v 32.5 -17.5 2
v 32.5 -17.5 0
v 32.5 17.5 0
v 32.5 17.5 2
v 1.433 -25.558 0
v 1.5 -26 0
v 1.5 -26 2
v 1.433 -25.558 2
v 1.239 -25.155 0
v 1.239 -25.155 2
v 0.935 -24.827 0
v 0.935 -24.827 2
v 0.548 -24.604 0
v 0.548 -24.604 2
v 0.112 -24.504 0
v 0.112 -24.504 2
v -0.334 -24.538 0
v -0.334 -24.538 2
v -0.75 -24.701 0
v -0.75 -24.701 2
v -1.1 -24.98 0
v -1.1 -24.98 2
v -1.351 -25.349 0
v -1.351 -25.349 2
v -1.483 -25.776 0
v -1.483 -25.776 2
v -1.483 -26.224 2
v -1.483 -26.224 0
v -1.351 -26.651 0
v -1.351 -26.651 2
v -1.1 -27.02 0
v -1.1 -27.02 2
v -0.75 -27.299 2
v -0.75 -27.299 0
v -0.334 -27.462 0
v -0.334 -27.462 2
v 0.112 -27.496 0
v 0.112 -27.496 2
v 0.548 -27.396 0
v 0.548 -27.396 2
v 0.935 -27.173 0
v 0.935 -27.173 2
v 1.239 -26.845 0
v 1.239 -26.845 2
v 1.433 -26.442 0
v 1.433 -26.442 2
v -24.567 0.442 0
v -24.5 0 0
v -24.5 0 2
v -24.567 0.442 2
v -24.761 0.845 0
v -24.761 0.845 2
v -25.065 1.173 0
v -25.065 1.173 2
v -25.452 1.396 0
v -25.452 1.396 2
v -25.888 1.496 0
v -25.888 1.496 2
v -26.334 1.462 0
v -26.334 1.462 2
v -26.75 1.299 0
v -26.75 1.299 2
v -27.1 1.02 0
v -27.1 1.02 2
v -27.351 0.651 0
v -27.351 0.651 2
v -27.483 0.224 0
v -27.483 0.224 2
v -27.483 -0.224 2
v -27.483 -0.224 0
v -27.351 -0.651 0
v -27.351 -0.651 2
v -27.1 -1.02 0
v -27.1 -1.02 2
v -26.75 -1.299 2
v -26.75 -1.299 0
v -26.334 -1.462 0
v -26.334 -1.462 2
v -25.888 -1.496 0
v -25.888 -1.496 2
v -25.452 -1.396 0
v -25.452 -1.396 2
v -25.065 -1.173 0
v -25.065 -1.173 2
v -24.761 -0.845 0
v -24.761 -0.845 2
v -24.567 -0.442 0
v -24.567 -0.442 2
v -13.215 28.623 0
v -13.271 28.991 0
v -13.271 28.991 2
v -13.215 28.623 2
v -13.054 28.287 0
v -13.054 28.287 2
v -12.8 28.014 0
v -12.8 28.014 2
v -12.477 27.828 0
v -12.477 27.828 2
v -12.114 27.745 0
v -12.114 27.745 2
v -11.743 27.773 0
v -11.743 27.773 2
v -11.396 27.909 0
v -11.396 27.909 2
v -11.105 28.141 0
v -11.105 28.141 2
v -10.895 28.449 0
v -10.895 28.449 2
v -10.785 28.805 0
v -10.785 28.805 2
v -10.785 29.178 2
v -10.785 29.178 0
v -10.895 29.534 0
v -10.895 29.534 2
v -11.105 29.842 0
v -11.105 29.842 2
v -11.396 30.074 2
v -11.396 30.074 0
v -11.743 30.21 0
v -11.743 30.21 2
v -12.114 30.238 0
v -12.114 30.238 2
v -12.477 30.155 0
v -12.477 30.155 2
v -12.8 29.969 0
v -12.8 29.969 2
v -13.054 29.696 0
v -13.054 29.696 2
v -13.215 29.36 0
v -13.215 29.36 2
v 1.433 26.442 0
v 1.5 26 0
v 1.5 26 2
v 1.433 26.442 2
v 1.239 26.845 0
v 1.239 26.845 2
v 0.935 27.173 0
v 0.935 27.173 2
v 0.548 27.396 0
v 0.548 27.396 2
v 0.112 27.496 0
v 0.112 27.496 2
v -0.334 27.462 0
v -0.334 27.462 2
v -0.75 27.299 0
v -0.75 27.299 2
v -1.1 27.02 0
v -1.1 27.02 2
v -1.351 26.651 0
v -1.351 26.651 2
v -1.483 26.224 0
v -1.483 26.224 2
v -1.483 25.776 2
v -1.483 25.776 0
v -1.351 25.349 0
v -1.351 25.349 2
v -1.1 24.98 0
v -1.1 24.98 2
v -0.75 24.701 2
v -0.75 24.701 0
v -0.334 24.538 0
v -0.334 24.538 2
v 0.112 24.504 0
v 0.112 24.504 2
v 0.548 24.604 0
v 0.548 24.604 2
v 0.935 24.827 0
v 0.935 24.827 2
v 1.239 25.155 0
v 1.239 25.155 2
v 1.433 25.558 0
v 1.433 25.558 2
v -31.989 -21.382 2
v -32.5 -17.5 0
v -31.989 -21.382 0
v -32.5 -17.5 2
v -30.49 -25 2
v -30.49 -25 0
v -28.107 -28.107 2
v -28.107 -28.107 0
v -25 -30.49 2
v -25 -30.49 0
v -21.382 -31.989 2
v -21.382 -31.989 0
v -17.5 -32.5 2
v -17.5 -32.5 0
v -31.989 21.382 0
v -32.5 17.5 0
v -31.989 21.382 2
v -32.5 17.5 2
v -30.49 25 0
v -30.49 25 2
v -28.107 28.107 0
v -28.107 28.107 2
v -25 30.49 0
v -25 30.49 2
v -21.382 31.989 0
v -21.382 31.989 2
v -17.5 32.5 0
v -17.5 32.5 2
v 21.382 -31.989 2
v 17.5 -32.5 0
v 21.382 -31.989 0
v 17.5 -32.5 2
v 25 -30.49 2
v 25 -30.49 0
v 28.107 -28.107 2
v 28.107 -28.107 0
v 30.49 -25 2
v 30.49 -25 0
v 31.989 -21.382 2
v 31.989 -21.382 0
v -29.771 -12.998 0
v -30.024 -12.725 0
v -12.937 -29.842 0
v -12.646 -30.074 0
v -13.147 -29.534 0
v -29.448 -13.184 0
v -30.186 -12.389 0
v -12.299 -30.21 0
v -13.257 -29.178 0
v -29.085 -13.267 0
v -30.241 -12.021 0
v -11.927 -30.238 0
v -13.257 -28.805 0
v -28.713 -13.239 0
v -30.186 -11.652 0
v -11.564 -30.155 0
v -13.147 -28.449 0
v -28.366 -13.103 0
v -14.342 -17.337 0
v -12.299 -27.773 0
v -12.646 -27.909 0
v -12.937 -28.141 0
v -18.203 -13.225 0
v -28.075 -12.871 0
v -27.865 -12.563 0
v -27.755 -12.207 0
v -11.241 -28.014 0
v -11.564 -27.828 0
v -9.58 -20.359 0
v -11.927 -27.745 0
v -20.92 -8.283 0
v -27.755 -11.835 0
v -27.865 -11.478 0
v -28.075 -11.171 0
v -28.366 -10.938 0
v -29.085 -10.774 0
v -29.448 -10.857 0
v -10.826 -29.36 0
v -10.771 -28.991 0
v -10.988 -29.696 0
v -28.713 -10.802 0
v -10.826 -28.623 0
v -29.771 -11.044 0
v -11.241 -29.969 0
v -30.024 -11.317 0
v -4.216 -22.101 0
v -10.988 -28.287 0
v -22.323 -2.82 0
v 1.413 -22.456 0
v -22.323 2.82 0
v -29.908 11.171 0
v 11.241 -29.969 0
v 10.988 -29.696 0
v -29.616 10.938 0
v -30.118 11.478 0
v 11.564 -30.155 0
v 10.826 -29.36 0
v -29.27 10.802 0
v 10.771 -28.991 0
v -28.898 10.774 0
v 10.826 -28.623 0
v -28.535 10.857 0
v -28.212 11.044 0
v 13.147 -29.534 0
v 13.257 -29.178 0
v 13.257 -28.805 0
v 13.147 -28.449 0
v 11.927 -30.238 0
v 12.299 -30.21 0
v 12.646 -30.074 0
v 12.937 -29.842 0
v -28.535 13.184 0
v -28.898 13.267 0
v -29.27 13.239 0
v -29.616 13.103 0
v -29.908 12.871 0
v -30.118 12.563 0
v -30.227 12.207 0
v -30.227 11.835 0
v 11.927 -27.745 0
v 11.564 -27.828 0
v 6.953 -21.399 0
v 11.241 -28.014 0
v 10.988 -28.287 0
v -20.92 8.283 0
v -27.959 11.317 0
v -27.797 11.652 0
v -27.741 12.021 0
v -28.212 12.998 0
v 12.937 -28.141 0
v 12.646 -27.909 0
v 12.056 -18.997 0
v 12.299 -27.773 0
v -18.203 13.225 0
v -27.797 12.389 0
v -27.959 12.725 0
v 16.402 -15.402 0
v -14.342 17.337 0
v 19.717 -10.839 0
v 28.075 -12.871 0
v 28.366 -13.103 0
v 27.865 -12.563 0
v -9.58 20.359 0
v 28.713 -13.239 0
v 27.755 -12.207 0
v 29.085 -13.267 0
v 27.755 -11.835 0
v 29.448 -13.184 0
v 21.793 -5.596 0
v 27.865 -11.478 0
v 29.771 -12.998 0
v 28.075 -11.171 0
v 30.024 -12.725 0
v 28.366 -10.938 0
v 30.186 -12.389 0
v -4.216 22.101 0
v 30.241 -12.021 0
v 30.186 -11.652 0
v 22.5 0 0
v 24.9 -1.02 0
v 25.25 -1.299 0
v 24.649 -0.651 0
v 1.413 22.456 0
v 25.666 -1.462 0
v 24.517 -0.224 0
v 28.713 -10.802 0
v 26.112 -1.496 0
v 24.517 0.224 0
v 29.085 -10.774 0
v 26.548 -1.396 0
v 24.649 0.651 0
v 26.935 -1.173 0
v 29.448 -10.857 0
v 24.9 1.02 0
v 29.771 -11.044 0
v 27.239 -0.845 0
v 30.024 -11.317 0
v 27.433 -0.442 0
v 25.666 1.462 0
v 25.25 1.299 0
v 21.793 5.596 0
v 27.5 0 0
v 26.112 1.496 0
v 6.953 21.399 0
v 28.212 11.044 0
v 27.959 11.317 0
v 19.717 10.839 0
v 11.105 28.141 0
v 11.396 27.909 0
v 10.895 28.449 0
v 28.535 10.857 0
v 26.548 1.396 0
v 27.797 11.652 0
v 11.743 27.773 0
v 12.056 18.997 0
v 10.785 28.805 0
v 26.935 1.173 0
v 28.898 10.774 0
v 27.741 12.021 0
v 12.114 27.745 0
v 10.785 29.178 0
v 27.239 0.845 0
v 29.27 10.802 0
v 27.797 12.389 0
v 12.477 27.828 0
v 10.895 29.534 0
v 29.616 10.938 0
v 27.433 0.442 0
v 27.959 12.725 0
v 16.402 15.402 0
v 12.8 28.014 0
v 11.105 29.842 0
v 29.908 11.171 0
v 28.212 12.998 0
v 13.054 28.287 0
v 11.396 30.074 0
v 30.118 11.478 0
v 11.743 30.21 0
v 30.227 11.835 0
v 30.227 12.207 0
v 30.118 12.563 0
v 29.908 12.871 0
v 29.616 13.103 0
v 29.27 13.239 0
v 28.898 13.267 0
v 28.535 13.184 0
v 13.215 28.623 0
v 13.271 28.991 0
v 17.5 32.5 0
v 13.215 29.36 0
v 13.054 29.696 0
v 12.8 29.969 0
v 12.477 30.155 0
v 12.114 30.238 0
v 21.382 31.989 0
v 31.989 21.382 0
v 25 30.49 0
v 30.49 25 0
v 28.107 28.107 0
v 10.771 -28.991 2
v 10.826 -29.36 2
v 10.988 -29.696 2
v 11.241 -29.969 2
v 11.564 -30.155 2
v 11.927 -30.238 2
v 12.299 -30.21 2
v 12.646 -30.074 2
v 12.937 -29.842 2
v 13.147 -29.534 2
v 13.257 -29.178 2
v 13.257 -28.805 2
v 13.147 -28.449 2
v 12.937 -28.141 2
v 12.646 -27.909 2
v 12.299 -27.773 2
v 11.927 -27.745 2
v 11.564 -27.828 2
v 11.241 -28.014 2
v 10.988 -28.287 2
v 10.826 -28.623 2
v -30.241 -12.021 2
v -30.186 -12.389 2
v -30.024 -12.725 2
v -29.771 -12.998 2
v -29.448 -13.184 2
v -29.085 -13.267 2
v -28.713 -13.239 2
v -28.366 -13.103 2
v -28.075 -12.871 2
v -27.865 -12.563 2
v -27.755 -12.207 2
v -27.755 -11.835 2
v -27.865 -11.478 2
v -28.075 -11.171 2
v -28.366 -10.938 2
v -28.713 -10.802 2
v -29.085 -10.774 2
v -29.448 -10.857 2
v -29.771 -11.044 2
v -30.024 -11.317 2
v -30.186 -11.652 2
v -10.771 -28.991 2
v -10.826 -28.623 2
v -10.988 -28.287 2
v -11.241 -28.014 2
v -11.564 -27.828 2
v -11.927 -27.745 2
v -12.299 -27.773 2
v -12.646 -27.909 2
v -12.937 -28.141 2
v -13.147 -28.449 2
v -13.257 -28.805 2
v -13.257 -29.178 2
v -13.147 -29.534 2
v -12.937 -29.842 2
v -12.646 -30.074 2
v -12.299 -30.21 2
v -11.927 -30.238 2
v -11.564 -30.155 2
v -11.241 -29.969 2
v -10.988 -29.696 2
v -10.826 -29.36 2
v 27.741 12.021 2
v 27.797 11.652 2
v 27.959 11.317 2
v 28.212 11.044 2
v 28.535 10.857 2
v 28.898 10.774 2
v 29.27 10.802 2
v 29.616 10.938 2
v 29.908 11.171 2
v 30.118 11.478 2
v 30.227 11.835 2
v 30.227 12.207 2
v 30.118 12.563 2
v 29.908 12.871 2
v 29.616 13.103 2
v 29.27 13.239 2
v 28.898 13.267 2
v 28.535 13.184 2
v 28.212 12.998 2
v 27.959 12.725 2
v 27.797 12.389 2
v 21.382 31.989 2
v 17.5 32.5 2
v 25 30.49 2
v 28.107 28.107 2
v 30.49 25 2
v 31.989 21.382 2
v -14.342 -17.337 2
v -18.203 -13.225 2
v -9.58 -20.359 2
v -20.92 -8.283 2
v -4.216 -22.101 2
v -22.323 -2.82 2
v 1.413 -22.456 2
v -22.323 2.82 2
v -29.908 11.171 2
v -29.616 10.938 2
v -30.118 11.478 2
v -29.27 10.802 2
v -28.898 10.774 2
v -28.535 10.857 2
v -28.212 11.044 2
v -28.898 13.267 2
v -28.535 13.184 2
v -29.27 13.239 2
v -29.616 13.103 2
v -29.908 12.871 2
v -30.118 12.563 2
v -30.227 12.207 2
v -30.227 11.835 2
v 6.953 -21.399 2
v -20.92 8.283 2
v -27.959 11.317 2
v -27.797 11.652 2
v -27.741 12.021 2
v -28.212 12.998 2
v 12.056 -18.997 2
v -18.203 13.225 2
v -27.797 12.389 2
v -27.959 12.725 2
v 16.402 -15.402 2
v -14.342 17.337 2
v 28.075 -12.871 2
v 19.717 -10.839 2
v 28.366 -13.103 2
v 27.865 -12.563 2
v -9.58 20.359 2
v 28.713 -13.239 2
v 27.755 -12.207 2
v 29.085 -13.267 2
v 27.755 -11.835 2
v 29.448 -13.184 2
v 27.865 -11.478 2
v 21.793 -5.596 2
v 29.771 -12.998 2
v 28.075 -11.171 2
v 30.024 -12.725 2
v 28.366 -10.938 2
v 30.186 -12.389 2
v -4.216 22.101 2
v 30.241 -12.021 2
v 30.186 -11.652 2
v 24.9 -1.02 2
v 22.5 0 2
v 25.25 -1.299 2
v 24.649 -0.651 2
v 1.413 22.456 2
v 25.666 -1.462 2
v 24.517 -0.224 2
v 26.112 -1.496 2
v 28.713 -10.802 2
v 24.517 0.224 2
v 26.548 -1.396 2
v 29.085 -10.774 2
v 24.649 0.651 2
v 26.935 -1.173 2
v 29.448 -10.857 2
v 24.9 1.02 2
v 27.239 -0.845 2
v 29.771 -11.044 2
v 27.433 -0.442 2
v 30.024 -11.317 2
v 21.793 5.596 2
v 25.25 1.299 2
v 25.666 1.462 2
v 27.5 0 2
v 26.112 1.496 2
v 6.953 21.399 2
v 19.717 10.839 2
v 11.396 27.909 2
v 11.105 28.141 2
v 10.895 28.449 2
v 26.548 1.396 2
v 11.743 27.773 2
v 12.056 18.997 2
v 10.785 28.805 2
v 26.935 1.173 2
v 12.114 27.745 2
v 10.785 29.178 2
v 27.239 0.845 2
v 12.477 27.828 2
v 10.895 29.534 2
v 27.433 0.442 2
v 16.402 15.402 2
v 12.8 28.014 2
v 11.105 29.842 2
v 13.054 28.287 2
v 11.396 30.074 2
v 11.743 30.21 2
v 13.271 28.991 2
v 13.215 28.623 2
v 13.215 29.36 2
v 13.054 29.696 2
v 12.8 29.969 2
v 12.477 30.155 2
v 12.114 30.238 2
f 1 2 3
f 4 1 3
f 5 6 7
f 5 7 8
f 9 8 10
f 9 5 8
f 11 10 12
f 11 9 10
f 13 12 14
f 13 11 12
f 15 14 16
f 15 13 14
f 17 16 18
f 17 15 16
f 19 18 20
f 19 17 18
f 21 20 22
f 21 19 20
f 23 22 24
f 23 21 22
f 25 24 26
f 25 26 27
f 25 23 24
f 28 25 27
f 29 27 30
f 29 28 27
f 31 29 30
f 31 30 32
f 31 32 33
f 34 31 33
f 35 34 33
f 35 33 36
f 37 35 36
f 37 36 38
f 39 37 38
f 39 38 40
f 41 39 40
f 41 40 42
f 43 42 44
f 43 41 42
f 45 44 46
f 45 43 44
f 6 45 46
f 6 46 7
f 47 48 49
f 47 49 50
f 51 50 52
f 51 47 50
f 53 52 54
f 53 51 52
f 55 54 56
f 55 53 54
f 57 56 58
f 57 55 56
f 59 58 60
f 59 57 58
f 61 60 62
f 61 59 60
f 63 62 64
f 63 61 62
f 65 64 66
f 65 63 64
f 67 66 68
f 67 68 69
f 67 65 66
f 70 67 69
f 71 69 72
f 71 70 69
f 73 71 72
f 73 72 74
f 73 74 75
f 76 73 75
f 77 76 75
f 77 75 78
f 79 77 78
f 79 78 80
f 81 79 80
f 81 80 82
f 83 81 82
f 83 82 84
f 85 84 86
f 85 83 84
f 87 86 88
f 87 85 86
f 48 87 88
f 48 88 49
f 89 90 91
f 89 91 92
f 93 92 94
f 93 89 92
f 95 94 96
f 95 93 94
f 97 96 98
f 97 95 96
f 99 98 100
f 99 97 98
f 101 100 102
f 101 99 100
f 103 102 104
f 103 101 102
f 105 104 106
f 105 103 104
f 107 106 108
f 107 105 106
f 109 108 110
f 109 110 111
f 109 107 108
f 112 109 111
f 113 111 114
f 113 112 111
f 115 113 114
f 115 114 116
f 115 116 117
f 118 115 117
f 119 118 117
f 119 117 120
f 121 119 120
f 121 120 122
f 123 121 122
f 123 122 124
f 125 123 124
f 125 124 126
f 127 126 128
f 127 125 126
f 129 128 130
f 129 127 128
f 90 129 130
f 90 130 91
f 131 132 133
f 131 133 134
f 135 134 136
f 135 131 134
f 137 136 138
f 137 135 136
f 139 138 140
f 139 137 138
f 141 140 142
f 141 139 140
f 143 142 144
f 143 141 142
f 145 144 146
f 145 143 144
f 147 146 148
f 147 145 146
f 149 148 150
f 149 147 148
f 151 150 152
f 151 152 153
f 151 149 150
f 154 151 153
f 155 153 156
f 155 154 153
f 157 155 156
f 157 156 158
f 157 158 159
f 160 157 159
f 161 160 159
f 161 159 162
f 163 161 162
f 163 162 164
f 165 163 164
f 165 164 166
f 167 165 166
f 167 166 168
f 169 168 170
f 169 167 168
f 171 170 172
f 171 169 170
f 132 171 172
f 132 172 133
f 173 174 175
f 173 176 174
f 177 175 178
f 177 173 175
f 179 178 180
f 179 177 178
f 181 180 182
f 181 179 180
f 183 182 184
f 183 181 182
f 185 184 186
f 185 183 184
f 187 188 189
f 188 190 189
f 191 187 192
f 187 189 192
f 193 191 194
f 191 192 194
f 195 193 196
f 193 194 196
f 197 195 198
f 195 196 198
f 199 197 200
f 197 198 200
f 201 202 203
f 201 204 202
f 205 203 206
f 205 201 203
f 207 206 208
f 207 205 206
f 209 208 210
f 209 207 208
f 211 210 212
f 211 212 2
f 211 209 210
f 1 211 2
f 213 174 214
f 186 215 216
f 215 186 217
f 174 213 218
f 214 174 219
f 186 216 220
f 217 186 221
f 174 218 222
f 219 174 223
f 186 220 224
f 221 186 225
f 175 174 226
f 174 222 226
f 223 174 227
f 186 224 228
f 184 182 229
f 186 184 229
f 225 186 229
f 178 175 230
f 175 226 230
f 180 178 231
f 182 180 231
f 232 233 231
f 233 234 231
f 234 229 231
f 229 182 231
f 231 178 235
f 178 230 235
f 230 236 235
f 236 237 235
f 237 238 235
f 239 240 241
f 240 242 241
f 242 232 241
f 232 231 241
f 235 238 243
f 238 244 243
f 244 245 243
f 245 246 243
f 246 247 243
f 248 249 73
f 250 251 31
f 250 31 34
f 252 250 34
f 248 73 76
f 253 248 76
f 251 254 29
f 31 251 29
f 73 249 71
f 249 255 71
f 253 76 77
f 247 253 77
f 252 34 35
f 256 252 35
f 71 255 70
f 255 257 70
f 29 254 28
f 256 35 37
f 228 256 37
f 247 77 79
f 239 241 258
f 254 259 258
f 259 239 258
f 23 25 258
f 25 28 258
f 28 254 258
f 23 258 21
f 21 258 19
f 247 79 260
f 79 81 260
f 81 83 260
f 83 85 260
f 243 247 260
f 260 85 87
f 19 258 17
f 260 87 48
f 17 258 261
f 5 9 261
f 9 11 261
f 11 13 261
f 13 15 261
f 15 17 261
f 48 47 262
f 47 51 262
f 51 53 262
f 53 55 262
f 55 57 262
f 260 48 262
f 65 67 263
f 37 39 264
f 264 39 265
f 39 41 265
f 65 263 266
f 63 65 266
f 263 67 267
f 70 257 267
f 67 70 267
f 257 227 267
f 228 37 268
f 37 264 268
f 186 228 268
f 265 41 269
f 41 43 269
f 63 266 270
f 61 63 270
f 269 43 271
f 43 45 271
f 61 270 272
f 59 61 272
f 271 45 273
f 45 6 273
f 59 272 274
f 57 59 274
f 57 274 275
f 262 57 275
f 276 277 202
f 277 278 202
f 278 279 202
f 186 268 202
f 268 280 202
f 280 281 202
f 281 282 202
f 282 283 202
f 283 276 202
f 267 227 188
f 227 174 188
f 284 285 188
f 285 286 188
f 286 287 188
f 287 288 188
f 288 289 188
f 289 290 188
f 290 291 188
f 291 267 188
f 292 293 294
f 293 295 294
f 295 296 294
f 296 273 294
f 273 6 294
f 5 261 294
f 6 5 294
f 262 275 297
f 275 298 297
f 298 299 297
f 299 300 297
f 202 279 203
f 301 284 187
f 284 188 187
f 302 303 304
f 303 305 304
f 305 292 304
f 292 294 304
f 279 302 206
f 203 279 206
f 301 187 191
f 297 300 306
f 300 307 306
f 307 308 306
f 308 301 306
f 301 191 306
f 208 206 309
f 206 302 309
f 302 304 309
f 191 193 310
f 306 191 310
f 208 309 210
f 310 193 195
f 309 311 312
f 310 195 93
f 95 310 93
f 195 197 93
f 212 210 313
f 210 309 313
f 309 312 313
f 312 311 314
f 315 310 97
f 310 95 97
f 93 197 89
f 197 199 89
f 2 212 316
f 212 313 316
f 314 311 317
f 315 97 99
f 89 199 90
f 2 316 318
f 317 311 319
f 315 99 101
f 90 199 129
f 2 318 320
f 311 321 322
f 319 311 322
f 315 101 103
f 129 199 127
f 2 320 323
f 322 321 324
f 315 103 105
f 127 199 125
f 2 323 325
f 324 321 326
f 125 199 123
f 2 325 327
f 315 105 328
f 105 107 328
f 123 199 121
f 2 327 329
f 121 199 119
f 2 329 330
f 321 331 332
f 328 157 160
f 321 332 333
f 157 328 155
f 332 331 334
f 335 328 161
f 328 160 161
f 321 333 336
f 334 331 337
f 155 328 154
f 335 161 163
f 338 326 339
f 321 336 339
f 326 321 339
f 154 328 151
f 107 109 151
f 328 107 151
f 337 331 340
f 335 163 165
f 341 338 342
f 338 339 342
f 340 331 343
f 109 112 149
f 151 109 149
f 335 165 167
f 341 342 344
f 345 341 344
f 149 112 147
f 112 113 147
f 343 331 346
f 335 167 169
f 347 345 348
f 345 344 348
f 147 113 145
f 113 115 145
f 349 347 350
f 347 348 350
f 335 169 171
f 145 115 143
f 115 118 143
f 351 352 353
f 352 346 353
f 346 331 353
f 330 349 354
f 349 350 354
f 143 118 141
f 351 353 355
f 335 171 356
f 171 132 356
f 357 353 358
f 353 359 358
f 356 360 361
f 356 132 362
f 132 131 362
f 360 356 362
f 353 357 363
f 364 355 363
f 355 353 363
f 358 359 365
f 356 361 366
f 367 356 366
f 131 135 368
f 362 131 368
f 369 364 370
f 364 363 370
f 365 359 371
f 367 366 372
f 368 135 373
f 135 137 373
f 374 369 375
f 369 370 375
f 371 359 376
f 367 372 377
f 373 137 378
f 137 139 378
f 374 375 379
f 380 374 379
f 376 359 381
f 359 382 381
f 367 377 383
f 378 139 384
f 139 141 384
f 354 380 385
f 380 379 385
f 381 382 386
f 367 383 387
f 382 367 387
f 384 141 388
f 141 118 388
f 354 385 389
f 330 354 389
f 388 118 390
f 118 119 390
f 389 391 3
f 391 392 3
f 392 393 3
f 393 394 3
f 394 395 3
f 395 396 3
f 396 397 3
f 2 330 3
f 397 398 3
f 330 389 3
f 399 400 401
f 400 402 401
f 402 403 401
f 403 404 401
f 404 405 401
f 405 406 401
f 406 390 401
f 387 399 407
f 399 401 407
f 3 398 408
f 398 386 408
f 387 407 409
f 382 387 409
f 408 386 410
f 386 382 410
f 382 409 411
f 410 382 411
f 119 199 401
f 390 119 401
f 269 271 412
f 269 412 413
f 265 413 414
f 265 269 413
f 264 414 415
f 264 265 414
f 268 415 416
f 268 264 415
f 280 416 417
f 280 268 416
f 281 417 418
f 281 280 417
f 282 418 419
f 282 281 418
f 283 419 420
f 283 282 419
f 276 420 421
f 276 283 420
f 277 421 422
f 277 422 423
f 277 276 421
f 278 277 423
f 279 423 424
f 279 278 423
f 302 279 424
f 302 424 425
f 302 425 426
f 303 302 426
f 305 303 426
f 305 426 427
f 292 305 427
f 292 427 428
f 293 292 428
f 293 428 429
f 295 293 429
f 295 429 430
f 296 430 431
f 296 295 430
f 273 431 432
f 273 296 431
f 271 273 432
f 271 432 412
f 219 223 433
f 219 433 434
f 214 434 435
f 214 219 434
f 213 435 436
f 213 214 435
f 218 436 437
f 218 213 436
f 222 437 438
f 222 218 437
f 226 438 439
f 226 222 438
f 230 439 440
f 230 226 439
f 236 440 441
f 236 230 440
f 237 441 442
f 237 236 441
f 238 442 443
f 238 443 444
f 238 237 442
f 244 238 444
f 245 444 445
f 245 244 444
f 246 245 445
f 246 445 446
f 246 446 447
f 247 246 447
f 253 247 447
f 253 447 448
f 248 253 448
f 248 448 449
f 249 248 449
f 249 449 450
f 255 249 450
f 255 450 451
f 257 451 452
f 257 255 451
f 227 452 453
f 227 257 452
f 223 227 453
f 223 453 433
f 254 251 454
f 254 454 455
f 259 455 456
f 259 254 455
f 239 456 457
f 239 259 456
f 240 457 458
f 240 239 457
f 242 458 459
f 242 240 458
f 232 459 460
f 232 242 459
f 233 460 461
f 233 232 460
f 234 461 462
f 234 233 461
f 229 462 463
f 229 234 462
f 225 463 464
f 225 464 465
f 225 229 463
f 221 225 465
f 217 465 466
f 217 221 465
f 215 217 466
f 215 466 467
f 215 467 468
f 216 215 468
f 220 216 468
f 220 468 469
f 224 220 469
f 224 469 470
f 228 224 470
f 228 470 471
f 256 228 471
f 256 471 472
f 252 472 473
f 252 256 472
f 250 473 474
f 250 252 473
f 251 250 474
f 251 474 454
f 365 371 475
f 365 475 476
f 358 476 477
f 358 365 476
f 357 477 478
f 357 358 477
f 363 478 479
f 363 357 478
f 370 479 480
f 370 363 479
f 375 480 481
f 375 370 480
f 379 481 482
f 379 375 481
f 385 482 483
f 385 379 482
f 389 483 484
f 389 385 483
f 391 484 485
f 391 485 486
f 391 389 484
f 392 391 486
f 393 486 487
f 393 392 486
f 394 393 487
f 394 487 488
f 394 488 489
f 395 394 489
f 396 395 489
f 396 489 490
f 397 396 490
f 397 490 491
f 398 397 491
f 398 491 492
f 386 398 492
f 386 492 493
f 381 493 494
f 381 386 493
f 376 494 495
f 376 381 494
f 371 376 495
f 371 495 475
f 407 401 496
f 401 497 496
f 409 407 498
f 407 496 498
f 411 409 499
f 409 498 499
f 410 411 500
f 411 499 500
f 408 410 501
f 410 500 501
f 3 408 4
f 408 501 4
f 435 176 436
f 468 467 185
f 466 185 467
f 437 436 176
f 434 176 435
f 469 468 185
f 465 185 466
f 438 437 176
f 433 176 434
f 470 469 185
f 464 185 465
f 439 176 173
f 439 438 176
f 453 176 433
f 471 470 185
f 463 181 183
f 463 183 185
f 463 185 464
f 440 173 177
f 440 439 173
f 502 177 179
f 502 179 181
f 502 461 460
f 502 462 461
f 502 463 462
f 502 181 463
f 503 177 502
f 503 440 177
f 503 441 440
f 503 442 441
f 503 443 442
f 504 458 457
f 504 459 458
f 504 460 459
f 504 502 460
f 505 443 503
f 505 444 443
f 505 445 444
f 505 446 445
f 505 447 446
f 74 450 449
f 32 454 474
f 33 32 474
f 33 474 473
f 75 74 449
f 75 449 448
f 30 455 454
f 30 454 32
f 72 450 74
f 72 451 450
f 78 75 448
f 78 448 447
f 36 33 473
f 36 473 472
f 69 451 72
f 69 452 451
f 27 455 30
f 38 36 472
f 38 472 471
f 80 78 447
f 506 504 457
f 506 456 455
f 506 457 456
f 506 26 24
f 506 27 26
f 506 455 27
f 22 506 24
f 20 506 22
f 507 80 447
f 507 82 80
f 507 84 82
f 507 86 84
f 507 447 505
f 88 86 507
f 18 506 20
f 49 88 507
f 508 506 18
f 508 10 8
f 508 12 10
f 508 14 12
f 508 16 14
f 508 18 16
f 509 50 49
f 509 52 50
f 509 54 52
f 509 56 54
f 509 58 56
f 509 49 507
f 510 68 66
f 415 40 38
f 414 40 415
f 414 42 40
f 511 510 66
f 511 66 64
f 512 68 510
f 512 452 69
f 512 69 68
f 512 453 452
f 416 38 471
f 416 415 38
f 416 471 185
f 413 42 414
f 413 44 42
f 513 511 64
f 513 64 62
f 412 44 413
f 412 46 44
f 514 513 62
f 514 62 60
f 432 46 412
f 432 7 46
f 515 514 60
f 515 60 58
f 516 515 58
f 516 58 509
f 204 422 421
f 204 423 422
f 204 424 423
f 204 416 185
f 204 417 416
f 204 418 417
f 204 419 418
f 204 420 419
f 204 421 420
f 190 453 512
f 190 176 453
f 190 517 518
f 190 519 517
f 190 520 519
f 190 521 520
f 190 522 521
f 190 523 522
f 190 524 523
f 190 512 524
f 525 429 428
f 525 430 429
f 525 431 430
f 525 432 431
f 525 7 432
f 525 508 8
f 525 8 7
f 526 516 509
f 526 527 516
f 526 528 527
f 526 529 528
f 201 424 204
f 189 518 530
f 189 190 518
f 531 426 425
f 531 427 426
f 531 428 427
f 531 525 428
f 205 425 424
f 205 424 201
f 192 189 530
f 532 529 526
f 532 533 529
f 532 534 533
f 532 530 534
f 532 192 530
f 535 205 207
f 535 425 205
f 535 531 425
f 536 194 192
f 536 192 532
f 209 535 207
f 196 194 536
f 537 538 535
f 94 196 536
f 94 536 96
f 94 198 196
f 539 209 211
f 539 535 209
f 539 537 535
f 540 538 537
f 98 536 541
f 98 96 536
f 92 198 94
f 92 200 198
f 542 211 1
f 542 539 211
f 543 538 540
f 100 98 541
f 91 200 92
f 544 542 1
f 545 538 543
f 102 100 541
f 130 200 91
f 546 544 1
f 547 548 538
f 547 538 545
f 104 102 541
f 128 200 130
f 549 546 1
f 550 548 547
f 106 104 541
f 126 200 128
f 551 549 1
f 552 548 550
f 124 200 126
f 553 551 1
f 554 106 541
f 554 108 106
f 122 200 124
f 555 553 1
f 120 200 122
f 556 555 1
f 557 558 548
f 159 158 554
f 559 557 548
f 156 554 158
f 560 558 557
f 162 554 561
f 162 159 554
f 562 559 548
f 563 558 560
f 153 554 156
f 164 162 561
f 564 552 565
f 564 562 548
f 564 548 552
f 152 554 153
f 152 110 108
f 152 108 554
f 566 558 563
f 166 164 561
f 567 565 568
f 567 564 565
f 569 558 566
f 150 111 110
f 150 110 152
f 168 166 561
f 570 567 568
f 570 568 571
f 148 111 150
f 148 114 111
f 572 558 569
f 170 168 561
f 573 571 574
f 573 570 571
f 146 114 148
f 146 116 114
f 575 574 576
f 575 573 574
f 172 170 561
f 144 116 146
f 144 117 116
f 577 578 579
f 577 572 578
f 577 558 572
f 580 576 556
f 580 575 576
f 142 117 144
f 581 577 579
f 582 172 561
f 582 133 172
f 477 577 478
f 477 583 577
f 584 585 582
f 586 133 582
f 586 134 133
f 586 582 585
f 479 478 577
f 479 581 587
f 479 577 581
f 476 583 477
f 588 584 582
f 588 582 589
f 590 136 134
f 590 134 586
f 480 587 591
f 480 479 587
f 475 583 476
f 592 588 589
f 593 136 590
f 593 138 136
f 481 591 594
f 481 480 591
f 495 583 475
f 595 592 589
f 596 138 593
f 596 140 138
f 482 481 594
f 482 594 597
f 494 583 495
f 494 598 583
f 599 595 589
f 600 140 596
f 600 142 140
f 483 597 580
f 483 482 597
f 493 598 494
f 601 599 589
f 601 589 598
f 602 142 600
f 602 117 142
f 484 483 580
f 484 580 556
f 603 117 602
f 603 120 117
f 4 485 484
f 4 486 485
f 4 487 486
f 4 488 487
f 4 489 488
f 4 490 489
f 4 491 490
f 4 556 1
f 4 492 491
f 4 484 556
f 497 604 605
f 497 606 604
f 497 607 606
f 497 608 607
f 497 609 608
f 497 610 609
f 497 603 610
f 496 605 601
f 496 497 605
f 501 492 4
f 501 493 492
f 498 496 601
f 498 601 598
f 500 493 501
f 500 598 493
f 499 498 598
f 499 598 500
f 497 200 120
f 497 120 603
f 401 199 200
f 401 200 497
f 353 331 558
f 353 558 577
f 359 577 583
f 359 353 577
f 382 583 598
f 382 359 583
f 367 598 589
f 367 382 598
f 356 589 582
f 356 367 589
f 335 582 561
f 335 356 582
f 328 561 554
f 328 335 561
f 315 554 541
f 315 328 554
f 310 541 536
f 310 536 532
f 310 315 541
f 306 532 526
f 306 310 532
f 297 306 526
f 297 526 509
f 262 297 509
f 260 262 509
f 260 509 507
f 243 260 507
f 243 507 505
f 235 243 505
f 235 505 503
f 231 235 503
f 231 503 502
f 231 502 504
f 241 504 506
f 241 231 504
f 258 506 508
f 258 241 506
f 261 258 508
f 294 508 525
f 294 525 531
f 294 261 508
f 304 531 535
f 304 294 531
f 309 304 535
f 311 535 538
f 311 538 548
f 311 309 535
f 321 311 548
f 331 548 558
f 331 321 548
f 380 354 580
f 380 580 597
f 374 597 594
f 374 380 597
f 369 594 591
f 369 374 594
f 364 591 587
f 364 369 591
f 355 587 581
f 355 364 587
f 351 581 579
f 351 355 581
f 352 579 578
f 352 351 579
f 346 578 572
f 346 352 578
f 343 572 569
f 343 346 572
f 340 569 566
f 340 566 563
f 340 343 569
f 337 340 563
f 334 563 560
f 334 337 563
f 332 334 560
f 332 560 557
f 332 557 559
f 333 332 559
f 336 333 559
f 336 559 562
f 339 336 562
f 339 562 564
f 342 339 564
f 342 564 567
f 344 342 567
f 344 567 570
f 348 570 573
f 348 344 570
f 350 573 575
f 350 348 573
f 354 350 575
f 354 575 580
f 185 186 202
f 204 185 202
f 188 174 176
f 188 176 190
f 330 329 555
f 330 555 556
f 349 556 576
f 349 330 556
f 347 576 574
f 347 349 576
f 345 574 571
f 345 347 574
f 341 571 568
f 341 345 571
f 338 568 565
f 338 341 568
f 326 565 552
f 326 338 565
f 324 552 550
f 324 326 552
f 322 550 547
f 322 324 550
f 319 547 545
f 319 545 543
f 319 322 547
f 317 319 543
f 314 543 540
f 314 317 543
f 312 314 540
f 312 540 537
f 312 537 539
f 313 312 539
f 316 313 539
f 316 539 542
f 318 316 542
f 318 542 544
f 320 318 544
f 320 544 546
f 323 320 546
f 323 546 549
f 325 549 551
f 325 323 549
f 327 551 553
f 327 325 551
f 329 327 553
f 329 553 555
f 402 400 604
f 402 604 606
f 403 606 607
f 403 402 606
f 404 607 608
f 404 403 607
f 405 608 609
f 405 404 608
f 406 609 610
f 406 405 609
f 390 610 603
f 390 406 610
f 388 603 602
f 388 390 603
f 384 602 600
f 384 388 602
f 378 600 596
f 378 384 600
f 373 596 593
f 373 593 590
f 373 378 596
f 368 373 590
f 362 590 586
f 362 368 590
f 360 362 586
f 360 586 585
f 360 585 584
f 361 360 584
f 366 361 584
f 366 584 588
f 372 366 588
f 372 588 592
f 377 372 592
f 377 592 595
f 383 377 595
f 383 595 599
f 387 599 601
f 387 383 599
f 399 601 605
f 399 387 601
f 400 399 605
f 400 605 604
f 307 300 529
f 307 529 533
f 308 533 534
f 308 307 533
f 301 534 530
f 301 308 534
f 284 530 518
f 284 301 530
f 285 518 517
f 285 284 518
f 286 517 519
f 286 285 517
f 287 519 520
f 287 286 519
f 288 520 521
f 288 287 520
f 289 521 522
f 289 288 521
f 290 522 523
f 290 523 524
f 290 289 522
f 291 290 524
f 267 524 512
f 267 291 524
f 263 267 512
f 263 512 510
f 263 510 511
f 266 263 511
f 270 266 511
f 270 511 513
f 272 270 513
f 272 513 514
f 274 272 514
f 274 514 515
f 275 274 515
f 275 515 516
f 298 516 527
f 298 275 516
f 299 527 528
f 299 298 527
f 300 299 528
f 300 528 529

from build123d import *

# Parameters (mm, degrees)
CROQUIS1_W              = 65
CROQUIS1_H              = 65
CROQUIS1_R              = 22.5
CROQUIS1_R_2            = 1.5
CROQUIS1_R_3            = 1.25
SALIENTE_EXTRUIR1_DEPTH = 2
REDONDEO1_R             = 15


with BuildPart() as part:
    # Croquis1 → Saliente-Extruir1 (new body)
    with BuildSketch(Plane.XY):
        Rectangle(CROQUIS1_W, CROQUIS1_H)
        Circle(CROQUIS1_R, mode=Mode.SUBTRACT)
        with Locations((0, 26)):
            Circle(CROQUIS1_R_2, mode=Mode.SUBTRACT)
        with Locations((26, 0)):
            Circle(CROQUIS1_R_2, mode=Mode.SUBTRACT)
        with Locations((0, -26)):
            Circle(CROQUIS1_R_2, mode=Mode.SUBTRACT)
        with Locations((-26, 0)):
            Circle(CROQUIS1_R_2, mode=Mode.SUBTRACT)
        with Locations((12.02081528, 28.991378029)):
            Circle(CROQUIS1_R_3, mode=Mode.SUBTRACT)
        with Locations(Location((28.991378029, 12.02081528, 0), (0, 0, 180))):
            Circle(CROQUIS1_R_3, mode=Mode.SUBTRACT)
        with Locations(Location((12.02081528, -28.991378029, 0), (0, 0, 180))):
            Circle(CROQUIS1_R_3, mode=Mode.SUBTRACT)
        with Locations((28.991378029, -12.02081528)):
            Circle(CROQUIS1_R_3, mode=Mode.SUBTRACT)
        with Locations(Location((-28.991378029, -12.02081528, 0), (0, 0, 180))):
            Circle(CROQUIS1_R_3, mode=Mode.SUBTRACT)
        with Locations((-12.02081528, -28.991378029)):
            Circle(CROQUIS1_R_3, mode=Mode.SUBTRACT)
        with Locations(Location((-12.02081528, 28.991378029, 0), (0, 0, 180))):
            Circle(CROQUIS1_R_3, mode=Mode.SUBTRACT)
        with Locations((-28.991378029, 12.02081528)):
            Circle(CROQUIS1_R_3, mode=Mode.SUBTRACT)
    extrude(amount=SALIENTE_EXTRUIR1_DEPTH)

    # Redondeo1
    redondeo1_edges = [part.edges().sort_by_distance(p)[0] for p in [
        (-32.5, 32.5, 1),
        (32.5, 32.5, 1),
        (32.5, -32.5, 1),
        (-32.5, -32.5, 1),
    ]]
    fillet(redondeo1_edges, radius=REDONDEO1_R)


solid = part.part
